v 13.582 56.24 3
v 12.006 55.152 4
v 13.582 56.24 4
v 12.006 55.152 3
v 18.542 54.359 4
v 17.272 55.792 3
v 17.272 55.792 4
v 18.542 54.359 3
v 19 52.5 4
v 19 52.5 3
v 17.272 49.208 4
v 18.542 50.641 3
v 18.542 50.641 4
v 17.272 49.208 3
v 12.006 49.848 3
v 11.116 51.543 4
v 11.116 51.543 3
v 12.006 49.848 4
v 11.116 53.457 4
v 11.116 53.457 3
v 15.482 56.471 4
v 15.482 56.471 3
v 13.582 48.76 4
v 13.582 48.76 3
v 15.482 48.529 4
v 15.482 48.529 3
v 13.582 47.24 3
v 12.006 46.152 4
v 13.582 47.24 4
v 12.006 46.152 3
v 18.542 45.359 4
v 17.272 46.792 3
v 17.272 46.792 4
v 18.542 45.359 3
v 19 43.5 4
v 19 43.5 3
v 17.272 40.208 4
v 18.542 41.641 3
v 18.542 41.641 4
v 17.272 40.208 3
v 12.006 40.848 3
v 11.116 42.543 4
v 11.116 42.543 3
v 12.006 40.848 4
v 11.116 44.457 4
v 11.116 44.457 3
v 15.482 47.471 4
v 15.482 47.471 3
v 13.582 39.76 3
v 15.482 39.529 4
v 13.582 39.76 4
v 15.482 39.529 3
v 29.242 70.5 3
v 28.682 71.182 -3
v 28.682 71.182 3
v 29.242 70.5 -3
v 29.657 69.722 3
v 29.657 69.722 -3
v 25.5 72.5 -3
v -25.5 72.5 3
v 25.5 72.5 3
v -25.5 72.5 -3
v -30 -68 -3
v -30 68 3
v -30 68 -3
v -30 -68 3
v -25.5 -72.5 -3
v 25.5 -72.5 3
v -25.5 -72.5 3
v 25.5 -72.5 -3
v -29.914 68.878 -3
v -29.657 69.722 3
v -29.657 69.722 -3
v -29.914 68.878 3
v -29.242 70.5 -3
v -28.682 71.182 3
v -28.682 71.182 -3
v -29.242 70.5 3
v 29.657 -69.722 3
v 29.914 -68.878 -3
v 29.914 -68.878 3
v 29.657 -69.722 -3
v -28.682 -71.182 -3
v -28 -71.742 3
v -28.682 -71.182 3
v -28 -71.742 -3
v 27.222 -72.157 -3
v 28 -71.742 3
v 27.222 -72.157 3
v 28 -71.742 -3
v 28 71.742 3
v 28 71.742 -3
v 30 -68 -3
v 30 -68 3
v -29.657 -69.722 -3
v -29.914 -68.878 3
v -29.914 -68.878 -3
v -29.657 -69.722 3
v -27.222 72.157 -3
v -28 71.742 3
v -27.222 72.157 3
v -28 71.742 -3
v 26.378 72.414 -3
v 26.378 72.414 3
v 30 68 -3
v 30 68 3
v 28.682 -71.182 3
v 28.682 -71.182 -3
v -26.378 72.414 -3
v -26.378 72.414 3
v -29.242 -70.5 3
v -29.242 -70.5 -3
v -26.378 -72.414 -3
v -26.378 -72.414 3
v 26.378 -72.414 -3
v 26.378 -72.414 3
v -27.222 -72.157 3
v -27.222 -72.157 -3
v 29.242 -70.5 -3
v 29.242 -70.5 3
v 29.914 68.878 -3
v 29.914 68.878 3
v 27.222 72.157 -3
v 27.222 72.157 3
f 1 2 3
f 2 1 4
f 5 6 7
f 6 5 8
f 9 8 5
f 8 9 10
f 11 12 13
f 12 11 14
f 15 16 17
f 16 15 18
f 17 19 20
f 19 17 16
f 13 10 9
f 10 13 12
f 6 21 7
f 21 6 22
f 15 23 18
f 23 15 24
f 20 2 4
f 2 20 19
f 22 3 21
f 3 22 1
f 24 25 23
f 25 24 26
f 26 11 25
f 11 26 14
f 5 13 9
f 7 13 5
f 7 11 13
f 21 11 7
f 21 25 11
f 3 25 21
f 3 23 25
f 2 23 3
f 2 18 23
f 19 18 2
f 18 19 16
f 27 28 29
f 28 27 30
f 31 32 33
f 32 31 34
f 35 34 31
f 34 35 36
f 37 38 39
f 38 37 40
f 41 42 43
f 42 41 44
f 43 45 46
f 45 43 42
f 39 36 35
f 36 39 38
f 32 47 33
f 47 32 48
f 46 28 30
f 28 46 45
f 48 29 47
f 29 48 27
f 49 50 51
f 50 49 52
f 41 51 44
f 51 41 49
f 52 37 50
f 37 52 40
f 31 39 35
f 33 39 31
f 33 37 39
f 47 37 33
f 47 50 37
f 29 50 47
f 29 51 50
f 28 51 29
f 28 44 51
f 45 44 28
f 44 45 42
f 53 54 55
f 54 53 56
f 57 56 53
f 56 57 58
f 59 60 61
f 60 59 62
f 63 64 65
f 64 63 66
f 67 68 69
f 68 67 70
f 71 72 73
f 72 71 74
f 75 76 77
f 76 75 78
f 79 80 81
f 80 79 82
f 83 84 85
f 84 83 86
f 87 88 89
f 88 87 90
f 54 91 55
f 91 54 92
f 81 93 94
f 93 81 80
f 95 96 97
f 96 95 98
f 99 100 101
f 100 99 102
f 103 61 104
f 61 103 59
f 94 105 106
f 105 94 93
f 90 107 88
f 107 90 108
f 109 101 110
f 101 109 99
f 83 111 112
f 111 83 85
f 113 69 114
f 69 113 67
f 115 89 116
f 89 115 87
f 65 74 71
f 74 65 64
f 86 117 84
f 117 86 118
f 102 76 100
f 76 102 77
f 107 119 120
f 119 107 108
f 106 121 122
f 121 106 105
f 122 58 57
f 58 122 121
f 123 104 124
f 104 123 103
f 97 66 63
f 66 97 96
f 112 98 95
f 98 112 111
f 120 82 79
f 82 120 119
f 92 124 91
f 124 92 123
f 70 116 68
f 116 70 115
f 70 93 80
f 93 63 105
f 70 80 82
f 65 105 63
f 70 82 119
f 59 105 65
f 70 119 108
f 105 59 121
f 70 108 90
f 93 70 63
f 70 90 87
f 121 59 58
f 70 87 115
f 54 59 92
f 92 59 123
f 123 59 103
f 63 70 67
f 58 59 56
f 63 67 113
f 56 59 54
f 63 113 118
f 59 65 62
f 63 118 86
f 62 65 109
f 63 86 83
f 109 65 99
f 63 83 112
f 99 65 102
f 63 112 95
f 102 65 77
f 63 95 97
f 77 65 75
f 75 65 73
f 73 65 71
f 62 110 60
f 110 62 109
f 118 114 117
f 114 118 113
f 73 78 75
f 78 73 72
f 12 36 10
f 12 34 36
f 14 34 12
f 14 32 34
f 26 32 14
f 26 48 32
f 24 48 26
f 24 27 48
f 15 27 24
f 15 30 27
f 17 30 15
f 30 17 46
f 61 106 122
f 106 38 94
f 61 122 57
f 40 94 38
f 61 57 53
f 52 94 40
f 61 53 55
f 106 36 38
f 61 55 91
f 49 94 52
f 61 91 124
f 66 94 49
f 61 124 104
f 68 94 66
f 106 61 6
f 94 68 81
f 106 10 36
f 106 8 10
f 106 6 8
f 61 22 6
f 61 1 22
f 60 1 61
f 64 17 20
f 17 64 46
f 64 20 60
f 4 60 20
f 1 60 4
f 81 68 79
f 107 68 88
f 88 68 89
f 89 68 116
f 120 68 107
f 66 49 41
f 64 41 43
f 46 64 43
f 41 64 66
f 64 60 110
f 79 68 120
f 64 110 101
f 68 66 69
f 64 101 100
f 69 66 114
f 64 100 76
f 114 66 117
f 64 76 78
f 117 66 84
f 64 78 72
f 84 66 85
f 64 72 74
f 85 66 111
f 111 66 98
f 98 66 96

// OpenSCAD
echo("Работа Алексея Коротких!");
len_phone = 145;
width_phone = 60;
thickness_phone = 6;
corner_round = 9;

smartphone();

module smartphone() {
    smartphone_block();
    cameras_block();
}

module cameras_block() {
    color("blue")
    translate([width_phone/2-15, len_phone/2-20, 0])
    cylinder(d=8, h = thickness_phone/2+1);

    color("blue")
    translate([width_phone/2-15, len_phone/2-29, 0])
    cylinder(d=8, h = thickness_phone/2+1);
}

module smartphone_block() {
    hull() {
        translate([width_phone/2-corner_round/2, len_phone/2-corner_round/2, 0])
        cylinder(h=thickness_phone, d=corner_round, $fn=32, center=true);
        
        mirror([1, 0, 0])
        translate([width_phone/2-corner_round/2, len_phone/2-corner_round/2, 0])
        cylinder(h=thickness_phone, d=corner_round, $fn=32, center=true);
        
        mirror([0, 1, 0])
        translate([width_phone/2-corner_round/2, len_phone/2-corner_round/2, 0])
        cylinder(h=thickness_phone, d=corner_round, $fn=32, center=true);
        
        mirror([1, 0, 0])
        mirror([0, 1, 0])
        translate([width_phone/2-corner_round/2, len_phone/2-corner_round/2, 0])
        cylinder(h=thickness_phone, d=corner_round, $fn=32, center=true);
    }
}
